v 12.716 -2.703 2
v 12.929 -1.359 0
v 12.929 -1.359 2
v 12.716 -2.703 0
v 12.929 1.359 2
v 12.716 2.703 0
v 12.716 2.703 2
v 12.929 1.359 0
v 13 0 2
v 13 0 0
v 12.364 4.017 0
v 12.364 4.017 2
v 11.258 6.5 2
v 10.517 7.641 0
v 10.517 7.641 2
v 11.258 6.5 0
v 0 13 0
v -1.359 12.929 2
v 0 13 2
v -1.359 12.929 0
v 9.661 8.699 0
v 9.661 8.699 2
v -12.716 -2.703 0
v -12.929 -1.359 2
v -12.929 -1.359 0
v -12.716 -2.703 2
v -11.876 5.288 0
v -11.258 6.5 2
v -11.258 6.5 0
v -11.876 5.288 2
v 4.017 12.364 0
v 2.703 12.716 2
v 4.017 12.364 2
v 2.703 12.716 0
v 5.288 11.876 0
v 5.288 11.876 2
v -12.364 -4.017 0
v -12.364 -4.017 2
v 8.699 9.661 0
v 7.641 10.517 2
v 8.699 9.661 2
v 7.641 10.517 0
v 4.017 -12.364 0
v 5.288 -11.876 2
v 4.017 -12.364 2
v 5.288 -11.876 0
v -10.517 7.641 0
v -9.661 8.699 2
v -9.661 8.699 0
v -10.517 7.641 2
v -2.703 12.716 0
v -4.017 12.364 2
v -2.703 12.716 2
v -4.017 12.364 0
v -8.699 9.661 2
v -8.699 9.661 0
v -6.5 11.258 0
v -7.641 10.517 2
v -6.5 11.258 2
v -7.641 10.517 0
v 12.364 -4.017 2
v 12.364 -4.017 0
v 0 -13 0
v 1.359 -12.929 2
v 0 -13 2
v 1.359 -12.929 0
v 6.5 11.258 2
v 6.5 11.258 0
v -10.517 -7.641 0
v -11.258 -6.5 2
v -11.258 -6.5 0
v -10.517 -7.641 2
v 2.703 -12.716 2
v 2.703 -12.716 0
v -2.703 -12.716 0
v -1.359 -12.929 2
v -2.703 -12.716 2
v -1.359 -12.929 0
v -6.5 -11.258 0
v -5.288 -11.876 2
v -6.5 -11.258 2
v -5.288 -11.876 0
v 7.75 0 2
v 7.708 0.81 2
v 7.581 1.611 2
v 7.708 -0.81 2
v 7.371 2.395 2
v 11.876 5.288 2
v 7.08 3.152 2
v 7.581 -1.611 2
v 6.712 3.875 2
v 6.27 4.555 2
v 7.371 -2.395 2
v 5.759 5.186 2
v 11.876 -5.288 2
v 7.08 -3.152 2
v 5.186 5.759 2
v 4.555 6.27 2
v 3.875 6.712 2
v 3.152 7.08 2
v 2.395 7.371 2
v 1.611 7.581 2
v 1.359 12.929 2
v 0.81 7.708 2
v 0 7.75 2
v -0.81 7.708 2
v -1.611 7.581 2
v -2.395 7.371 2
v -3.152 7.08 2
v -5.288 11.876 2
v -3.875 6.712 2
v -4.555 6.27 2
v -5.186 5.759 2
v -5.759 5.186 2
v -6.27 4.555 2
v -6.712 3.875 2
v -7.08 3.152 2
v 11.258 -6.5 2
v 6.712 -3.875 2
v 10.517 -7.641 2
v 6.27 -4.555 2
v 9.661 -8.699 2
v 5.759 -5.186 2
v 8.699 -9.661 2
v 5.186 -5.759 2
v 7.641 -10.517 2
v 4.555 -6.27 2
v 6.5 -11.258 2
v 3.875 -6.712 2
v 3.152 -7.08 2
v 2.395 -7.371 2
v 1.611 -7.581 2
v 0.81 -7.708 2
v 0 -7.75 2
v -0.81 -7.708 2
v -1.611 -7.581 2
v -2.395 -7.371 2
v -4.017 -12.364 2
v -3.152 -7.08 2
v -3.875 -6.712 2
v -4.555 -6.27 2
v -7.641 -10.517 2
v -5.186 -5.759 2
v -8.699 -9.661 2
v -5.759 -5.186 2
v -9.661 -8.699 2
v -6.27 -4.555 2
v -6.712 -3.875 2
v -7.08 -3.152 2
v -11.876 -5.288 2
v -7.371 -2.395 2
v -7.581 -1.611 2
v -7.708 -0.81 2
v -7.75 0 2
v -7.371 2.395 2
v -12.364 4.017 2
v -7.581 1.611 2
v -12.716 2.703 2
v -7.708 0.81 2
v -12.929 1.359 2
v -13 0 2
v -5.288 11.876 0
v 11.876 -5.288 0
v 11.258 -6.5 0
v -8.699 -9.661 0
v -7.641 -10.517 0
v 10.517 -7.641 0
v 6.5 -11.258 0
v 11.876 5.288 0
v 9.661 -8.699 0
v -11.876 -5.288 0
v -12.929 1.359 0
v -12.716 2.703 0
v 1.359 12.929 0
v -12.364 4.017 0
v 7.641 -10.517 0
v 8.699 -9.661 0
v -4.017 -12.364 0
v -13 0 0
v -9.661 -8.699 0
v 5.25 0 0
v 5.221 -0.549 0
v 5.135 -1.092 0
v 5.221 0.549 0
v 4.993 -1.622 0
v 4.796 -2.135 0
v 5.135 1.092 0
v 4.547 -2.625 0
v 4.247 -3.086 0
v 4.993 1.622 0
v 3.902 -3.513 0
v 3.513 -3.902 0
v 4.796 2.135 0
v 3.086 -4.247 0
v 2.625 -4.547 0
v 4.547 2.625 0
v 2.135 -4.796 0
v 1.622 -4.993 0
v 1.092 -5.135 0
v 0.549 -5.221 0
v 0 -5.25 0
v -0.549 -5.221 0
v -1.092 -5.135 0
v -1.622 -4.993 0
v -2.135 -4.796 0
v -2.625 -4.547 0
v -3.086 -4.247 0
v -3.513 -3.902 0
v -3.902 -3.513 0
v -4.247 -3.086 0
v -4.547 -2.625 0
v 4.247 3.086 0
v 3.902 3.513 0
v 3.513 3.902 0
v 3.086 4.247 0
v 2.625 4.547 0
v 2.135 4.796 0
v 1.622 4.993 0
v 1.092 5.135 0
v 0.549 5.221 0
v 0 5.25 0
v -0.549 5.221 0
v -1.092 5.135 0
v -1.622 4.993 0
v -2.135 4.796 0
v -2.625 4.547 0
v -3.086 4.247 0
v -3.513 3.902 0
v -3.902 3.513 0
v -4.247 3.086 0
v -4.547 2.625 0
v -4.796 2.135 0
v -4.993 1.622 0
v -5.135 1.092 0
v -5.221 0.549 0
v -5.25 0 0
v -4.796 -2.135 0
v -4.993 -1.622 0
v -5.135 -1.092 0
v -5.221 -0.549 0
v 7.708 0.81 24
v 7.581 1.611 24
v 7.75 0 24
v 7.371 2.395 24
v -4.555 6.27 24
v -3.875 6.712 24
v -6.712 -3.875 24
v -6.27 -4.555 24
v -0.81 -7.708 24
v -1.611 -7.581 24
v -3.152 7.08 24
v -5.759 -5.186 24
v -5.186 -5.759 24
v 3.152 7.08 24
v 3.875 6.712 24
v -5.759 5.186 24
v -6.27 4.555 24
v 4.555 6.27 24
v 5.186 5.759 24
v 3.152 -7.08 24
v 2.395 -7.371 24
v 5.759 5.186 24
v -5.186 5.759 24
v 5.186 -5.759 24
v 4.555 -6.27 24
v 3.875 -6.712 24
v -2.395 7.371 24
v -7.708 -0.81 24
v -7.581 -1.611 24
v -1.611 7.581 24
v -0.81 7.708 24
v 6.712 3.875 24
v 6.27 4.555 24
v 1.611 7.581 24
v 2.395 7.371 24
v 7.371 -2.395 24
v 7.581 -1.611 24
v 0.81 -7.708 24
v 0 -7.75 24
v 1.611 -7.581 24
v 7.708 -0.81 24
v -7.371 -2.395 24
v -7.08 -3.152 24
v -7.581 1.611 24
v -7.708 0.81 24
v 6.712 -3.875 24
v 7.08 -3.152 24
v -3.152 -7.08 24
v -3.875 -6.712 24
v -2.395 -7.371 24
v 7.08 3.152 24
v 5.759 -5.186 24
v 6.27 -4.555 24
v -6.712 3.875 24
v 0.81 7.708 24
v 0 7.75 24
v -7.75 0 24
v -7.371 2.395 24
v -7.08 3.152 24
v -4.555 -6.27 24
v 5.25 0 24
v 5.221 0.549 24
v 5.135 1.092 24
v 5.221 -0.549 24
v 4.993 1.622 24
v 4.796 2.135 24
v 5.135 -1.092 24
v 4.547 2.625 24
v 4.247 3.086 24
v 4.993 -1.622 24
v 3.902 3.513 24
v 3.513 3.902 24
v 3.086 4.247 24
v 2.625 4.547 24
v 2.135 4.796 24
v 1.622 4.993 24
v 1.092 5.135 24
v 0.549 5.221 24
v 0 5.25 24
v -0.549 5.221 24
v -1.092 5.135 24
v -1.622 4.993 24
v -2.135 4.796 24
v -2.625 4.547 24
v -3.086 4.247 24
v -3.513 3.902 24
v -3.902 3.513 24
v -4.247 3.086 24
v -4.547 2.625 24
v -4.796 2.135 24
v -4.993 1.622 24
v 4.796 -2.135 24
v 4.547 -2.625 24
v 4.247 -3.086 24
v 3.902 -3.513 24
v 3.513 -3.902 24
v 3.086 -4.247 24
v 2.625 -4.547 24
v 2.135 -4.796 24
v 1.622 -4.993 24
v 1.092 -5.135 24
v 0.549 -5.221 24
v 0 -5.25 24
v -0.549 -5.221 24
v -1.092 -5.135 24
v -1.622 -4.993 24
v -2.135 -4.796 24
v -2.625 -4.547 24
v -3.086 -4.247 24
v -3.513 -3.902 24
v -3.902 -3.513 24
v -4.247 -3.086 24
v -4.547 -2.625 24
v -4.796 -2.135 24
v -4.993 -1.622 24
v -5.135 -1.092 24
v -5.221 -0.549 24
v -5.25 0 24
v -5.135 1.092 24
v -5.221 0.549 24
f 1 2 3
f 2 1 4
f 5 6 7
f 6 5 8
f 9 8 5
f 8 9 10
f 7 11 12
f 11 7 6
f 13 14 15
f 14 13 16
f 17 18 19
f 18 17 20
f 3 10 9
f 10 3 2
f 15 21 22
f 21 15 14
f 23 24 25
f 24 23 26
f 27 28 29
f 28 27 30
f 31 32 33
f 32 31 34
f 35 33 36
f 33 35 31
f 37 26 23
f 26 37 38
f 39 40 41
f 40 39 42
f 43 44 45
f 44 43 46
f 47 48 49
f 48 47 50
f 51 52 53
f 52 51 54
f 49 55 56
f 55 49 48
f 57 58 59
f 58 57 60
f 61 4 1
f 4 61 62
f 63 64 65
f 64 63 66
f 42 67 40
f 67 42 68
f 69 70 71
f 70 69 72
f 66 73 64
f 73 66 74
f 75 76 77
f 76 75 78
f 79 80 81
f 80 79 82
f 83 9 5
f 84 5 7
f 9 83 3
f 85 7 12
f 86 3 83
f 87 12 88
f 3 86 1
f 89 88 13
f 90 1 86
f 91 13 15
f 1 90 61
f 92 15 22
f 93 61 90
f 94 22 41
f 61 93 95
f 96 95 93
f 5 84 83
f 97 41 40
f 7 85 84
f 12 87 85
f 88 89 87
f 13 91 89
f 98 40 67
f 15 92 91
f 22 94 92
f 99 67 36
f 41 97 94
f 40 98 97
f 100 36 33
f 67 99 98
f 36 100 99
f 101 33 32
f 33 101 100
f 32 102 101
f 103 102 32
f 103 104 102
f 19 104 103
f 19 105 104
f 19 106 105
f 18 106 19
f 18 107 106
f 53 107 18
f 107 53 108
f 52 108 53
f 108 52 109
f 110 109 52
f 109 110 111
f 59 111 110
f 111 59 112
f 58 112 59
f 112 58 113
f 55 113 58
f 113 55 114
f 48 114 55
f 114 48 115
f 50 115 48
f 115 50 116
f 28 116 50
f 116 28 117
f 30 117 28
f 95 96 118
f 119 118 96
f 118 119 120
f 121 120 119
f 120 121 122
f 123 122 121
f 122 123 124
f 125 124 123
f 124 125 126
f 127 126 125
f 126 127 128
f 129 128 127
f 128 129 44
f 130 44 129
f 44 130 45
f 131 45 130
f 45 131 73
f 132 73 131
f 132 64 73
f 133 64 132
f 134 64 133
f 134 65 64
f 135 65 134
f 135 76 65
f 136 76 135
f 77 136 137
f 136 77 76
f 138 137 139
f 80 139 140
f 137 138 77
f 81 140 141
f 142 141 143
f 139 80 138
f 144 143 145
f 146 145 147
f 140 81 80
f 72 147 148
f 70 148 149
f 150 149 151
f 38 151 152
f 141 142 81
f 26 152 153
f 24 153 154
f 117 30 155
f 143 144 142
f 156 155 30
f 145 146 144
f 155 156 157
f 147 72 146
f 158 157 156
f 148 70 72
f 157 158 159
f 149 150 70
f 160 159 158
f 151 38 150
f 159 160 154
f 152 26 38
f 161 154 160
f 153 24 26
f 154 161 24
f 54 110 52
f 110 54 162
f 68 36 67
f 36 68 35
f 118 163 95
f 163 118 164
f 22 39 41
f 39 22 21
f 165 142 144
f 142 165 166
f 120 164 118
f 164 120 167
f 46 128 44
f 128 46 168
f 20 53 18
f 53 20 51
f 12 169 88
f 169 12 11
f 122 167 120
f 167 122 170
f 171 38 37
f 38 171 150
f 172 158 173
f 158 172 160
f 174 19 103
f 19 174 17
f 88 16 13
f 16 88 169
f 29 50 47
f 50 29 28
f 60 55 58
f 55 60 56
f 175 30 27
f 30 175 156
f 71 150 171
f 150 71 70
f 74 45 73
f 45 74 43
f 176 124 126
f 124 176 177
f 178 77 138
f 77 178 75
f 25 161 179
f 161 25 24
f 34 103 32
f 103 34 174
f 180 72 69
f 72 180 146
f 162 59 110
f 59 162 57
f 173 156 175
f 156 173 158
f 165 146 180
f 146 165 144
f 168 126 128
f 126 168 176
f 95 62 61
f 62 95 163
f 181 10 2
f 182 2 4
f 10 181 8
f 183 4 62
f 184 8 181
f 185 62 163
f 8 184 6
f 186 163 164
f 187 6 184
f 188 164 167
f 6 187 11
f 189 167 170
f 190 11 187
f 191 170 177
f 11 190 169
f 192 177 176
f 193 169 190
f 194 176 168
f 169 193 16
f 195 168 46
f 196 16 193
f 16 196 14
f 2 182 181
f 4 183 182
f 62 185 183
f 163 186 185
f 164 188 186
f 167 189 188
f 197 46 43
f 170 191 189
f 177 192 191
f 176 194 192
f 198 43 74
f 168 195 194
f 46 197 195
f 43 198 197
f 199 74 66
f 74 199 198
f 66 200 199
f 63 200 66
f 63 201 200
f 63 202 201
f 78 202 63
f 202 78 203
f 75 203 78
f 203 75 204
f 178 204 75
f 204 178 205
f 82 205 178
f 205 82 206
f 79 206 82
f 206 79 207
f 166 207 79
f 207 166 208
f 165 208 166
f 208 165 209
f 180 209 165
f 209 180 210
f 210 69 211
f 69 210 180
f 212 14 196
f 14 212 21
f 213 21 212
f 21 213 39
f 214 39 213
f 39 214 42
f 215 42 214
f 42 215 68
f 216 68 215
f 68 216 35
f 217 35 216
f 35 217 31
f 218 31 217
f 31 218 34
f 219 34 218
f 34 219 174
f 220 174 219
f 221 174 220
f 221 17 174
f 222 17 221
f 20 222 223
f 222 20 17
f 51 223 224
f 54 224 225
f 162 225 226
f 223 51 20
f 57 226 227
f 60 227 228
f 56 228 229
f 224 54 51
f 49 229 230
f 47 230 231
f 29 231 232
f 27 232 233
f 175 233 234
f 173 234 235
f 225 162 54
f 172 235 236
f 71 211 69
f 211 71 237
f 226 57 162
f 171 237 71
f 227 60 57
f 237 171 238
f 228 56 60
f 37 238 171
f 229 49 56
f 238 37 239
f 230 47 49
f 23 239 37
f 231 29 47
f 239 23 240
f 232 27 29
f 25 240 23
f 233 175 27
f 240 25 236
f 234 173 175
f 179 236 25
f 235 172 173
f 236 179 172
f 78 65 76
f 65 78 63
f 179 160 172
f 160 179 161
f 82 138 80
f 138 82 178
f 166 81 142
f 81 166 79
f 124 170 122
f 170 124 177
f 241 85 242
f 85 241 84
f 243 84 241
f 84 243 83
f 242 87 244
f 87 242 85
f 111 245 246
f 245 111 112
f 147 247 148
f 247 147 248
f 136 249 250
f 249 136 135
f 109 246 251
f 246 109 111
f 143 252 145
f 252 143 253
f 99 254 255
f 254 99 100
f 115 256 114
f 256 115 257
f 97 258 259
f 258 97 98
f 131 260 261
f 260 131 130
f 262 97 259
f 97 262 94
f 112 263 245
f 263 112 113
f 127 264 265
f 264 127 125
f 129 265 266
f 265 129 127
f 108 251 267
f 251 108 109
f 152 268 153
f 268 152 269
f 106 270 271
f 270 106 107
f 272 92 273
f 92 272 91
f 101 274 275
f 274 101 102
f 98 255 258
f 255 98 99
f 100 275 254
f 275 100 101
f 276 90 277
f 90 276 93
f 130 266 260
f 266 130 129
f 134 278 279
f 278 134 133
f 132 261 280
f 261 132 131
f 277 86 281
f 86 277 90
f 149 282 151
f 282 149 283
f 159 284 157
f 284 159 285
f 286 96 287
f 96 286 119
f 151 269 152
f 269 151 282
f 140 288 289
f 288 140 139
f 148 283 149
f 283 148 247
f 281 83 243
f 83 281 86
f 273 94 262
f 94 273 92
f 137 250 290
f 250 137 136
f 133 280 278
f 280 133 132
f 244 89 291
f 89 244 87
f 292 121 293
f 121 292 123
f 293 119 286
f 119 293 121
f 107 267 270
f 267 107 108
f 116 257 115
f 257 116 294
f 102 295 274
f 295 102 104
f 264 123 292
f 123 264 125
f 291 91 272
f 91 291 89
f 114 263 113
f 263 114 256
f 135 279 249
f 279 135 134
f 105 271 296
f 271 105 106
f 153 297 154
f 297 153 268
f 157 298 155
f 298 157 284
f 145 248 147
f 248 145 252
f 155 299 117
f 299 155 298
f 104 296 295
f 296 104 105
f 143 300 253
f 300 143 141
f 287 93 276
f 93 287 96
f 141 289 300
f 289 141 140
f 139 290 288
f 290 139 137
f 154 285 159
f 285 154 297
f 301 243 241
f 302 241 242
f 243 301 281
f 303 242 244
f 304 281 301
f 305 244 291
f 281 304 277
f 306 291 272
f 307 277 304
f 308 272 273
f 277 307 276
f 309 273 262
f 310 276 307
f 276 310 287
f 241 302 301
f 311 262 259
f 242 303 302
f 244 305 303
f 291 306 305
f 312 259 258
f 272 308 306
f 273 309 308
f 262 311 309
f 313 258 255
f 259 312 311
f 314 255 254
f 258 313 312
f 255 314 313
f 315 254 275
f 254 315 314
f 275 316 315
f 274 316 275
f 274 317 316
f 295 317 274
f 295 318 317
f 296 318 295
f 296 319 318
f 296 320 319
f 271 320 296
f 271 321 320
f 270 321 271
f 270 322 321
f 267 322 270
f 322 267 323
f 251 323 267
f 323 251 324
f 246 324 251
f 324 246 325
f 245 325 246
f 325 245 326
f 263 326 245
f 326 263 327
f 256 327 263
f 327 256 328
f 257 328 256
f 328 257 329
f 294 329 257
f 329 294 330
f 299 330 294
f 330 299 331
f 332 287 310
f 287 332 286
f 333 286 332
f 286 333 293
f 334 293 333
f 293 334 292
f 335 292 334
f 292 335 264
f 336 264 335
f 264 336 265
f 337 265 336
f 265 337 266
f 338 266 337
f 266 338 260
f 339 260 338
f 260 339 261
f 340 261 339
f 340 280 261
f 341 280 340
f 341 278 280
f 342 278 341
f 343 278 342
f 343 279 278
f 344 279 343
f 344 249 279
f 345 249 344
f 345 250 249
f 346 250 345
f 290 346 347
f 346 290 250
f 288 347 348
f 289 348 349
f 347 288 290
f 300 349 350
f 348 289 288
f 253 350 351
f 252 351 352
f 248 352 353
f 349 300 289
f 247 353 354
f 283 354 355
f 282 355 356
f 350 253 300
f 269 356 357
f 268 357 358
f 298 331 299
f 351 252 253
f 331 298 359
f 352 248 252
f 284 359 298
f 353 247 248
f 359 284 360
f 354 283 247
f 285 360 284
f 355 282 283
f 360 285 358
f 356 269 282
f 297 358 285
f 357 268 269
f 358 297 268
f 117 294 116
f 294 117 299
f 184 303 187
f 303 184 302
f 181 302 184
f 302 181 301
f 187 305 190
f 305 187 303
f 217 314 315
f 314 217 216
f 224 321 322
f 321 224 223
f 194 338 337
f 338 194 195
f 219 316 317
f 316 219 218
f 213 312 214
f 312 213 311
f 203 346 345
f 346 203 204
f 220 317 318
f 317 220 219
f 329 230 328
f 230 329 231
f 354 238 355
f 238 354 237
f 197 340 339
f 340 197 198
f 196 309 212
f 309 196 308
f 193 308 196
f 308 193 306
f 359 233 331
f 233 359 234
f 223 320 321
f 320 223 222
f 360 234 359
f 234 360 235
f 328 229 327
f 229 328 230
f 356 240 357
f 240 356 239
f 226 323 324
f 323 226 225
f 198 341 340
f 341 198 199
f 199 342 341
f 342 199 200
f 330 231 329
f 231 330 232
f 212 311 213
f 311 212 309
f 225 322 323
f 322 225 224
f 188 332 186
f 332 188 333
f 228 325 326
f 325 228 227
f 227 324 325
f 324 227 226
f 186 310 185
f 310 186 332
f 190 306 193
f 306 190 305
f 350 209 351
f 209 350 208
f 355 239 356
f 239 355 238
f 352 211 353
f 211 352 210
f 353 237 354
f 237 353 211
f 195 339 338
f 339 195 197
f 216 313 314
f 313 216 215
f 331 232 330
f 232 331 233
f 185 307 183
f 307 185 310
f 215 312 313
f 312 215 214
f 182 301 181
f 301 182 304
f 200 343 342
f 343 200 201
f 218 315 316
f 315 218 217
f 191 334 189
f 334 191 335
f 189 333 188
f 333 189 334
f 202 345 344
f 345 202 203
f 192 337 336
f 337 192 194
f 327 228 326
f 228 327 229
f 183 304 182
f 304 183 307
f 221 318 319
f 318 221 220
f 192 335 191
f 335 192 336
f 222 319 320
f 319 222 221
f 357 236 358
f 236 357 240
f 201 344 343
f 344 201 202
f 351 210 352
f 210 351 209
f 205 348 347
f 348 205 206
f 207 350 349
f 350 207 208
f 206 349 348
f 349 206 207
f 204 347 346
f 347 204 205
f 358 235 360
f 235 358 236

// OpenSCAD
// Wall-mount standoff with screw flange.
$fn = 60;
eps = 0.02;
thread_d = 10.5;
base_d = 26;
length = 24;
difference() { union() { cylinder(d=base_d,h=2); cylinder(d=thread_d+5,h=length); } translate([0,0,-eps]) cylinder(d=thread_d,h=length+2*eps); }
